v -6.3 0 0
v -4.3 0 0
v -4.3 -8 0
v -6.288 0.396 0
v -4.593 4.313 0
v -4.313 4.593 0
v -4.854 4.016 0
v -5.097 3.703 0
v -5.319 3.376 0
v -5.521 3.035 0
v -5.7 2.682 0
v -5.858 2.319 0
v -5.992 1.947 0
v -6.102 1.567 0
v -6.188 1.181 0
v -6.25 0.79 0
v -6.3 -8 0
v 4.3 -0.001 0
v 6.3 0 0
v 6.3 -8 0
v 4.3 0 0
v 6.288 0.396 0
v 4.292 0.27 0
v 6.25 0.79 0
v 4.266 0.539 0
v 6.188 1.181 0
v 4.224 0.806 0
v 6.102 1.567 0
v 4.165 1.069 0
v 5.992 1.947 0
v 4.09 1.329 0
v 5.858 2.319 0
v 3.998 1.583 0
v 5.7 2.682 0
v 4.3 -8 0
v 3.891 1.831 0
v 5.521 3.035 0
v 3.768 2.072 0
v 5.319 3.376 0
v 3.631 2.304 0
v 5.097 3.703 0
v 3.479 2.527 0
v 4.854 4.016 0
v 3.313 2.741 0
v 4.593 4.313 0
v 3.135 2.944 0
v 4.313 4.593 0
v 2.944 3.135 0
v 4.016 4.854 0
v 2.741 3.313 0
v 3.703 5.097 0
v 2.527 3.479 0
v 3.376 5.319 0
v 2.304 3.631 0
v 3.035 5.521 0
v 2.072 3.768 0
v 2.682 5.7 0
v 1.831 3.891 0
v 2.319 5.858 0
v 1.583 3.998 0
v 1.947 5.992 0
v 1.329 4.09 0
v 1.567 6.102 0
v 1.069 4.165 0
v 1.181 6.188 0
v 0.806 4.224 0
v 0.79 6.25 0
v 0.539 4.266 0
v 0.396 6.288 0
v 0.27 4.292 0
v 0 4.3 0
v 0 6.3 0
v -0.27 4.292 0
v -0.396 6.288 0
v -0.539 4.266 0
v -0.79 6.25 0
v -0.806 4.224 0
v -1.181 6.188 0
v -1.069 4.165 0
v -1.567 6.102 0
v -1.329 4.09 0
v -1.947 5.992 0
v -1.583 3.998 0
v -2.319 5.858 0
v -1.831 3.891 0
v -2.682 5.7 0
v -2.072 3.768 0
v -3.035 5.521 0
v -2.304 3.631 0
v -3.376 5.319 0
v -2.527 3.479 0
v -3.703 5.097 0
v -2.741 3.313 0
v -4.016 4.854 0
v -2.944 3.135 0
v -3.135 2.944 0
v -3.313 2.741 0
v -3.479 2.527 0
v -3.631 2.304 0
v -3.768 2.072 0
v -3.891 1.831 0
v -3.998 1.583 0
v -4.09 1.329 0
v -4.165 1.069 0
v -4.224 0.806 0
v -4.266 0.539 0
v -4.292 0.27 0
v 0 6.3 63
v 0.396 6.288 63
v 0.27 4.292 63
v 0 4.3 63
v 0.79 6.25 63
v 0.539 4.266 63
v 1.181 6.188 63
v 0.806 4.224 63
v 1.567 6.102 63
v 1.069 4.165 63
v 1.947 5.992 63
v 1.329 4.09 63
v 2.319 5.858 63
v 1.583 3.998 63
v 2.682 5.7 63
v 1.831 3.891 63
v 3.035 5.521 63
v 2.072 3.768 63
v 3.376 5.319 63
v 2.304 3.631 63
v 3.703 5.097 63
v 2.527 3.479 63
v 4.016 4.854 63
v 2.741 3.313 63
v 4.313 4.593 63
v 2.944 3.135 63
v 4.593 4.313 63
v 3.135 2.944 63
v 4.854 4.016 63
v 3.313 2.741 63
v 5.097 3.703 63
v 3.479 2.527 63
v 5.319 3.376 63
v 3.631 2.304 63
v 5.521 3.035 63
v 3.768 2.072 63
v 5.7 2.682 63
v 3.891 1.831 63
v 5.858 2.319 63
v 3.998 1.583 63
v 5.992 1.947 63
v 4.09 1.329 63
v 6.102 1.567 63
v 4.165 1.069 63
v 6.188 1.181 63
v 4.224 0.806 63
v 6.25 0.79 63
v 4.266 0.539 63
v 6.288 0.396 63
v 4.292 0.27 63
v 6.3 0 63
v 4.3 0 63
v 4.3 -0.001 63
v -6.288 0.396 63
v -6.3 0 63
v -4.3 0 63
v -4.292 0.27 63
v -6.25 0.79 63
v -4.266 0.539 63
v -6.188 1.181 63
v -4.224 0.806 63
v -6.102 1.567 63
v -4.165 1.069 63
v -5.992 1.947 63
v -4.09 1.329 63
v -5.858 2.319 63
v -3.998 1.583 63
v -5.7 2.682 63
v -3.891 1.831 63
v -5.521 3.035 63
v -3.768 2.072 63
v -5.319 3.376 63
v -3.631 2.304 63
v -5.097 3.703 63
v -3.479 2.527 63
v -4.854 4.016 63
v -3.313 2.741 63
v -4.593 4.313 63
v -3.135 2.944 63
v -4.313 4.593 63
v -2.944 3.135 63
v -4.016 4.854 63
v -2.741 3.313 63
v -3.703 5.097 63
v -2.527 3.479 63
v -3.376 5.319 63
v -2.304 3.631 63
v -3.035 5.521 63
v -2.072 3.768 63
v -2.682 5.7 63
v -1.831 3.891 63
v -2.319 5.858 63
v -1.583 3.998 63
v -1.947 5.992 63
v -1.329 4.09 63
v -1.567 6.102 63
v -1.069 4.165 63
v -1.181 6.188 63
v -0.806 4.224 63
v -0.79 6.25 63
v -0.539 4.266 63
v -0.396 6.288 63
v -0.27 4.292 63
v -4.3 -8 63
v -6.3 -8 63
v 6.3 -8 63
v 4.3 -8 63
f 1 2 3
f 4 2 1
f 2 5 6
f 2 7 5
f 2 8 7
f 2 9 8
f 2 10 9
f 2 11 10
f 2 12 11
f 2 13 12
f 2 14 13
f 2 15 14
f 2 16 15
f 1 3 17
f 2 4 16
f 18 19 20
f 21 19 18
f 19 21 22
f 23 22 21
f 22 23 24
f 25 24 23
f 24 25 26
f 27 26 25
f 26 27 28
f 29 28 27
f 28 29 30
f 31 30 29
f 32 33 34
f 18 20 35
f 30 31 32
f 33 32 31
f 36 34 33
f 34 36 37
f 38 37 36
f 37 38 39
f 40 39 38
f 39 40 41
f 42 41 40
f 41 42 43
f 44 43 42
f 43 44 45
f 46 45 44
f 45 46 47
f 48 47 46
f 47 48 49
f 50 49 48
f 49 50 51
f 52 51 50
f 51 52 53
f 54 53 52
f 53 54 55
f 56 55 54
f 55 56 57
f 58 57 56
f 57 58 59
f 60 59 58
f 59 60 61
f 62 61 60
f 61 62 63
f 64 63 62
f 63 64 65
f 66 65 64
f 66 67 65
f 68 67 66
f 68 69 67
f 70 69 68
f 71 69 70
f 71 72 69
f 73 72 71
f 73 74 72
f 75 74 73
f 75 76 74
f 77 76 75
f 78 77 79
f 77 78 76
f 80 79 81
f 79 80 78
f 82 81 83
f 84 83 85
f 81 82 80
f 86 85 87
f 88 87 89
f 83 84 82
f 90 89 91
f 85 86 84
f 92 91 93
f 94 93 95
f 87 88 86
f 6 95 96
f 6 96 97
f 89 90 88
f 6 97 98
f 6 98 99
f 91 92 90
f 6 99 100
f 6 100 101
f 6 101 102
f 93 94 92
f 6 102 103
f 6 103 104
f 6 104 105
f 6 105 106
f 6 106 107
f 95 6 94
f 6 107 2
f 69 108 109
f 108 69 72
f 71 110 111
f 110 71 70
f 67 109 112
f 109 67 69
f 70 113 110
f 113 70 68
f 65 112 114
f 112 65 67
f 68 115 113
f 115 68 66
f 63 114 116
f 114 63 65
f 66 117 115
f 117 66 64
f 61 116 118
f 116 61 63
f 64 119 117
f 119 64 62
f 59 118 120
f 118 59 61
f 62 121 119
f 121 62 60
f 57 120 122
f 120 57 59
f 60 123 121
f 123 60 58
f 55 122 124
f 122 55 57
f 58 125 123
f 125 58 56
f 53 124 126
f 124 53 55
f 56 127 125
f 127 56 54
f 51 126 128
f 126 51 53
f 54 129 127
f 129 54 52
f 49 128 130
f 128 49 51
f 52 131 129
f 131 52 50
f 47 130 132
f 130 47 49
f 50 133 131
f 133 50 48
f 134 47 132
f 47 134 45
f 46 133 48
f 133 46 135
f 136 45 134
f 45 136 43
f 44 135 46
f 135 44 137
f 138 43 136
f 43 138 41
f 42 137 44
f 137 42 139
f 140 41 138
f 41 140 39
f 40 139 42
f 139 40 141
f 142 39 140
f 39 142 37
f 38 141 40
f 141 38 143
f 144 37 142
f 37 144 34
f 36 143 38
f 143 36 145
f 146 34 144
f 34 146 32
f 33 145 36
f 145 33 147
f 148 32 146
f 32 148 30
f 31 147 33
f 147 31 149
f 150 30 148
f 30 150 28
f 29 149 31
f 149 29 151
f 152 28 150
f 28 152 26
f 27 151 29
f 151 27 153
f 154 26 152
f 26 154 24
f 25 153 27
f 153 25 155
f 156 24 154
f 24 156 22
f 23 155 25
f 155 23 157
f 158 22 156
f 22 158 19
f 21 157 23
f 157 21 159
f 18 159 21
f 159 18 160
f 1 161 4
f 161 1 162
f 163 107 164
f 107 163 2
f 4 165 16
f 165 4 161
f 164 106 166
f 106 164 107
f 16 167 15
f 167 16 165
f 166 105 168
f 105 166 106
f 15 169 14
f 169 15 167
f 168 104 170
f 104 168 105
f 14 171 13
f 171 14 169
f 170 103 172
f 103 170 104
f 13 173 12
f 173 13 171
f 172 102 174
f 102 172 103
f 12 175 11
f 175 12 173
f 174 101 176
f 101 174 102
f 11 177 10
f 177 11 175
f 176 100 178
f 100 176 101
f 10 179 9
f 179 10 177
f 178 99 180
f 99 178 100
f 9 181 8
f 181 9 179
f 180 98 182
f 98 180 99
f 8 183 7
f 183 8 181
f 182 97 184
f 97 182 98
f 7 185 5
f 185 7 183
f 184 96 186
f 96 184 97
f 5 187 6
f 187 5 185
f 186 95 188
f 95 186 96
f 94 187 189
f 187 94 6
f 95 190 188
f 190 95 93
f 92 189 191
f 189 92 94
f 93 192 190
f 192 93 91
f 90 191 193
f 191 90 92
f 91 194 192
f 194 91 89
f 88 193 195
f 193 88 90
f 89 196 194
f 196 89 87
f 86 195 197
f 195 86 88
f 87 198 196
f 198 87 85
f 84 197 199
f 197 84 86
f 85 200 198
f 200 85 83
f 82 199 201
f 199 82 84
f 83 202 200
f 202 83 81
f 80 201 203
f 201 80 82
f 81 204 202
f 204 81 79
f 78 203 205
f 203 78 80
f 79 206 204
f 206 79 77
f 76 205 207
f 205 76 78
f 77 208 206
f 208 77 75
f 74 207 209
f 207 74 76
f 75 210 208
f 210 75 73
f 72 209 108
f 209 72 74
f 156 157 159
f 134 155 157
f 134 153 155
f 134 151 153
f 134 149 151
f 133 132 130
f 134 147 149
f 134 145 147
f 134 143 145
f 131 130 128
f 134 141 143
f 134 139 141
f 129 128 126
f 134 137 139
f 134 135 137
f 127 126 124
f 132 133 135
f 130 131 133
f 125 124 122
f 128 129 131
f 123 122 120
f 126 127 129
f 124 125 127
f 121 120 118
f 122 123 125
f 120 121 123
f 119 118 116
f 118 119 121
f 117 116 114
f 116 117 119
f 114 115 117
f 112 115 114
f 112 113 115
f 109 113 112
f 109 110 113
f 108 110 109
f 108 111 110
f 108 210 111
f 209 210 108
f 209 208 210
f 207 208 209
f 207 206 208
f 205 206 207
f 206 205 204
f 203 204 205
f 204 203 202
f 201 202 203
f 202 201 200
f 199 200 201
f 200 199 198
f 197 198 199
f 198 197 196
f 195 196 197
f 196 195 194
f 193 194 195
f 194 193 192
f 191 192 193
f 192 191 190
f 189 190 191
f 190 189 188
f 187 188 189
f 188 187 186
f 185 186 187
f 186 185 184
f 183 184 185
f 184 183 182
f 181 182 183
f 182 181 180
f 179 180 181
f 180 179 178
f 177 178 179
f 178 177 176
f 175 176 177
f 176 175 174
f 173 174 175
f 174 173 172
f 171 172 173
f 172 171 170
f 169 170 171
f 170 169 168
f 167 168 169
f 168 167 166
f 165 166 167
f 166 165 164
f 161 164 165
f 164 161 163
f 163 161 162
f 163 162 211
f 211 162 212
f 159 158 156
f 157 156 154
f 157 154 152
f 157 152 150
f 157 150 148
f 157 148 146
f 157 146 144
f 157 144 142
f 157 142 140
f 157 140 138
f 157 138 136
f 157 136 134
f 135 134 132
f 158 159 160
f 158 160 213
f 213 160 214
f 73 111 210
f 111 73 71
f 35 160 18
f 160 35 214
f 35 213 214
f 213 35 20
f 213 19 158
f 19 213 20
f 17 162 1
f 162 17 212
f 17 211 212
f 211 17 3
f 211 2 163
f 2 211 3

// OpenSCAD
// Width of guide rod
width = 8;
// Lenght from motor holder and bearing block
lenght = 63;
// Thickness
thickness = 2;
// Gap between leveler and guide rod
gap=.3;
  
union() {
    translate([width/2+gap,0,0]) rotate([90,0,0]) linear_extrude(width) r();
    translate([-width/2-(thickness+gap),0,0]) rotate([90,0,0]) linear_extrude(width) r();
    //rotate_extrude(angle=180, convexity=20, $fn=100) translate([width/2+.2,0,0]) r();
    rotate([0,0,-90]) Tube_Sect(Height=lenght,Dout=(width+gap*2)+(thickness*2),Din=width+gap*2,StartAngle=0,EndAngle=180,Faces=50);
}

module r() {
    square([2,lenght]);
}

// thanks to jpmendes http://forum.openscad.org/This-seems-to-be-ultra-basic-I-cannot-have-the-rotate-extrude-angle-parameter-working-td15180.html
module Tube_Sect(Height,Dout,Din,StartAngle,EndAngle,Faces) { 
                        
        StartAngle= (StartAngle < 0) ? 360+StartAngle : StartAngle; 
        EndAngle= (EndAngle < 0) ? 360+EndAngle : EndAngle; 
        echo(StartAngle, EndAngle); 
        EndAngle2 =  (EndAngle < StartAngle) ? StartAngle : EndAngle; 
        StartAngle2 =  (EndAngle < StartAngle) ? EndAngle : StartAngle; 
        
        
        if (EndAngle2-StartAngle2<360){ 
        
                NSides= (Faces < 3 || Faces==undef)  ?  DefaultFaces : Faces; 
                n=floor((EndAngle2-StartAngle2)/120); 
                Sect1=EndAngle2-StartAngle2-n*120; 
                Sect2= (n>0) ? 120 : 0; 
                Sect3=(n>1) ? 120 : 0; 

         intersection(){ 
                rotate_extrude(, $fn=floor(NSides*360/(EndAngle2-StartAngle2))) 
                       translate([Din/2,0,0]) square([(Dout-Din)/2,Height]); 
                
                  union(){ 
                                hull(){ 
                                        rotate(StartAngle2) cube([0.001,Dout,Height+1]); 
                                        rotate((StartAngle2+Sect1)) cube([0.001,Dout,Height+1]); 
                                } 
                                        hull(){ 
                                        rotate((StartAngle2+Sect1)) cube([0.001,Dout,Height+1]); 
                                        rotate((StartAngle2+Sect1+Sect2)) cube([0.001,Dout,Height+1]); 
                                } 
                                        hull(){ 
                                        rotate((StartAngle2+Sect1+Sect2)) cube([0.001,Dout,Height+1]); 
                                        rotate((StartAngle2+Sect1+Sect2+Sect3)) cube([0.001,Dout,Height+1]); 
                                } 
                        }	
                } 
                } else { echo("Only rotations less than 360 degrees are supported");} 
                
}
